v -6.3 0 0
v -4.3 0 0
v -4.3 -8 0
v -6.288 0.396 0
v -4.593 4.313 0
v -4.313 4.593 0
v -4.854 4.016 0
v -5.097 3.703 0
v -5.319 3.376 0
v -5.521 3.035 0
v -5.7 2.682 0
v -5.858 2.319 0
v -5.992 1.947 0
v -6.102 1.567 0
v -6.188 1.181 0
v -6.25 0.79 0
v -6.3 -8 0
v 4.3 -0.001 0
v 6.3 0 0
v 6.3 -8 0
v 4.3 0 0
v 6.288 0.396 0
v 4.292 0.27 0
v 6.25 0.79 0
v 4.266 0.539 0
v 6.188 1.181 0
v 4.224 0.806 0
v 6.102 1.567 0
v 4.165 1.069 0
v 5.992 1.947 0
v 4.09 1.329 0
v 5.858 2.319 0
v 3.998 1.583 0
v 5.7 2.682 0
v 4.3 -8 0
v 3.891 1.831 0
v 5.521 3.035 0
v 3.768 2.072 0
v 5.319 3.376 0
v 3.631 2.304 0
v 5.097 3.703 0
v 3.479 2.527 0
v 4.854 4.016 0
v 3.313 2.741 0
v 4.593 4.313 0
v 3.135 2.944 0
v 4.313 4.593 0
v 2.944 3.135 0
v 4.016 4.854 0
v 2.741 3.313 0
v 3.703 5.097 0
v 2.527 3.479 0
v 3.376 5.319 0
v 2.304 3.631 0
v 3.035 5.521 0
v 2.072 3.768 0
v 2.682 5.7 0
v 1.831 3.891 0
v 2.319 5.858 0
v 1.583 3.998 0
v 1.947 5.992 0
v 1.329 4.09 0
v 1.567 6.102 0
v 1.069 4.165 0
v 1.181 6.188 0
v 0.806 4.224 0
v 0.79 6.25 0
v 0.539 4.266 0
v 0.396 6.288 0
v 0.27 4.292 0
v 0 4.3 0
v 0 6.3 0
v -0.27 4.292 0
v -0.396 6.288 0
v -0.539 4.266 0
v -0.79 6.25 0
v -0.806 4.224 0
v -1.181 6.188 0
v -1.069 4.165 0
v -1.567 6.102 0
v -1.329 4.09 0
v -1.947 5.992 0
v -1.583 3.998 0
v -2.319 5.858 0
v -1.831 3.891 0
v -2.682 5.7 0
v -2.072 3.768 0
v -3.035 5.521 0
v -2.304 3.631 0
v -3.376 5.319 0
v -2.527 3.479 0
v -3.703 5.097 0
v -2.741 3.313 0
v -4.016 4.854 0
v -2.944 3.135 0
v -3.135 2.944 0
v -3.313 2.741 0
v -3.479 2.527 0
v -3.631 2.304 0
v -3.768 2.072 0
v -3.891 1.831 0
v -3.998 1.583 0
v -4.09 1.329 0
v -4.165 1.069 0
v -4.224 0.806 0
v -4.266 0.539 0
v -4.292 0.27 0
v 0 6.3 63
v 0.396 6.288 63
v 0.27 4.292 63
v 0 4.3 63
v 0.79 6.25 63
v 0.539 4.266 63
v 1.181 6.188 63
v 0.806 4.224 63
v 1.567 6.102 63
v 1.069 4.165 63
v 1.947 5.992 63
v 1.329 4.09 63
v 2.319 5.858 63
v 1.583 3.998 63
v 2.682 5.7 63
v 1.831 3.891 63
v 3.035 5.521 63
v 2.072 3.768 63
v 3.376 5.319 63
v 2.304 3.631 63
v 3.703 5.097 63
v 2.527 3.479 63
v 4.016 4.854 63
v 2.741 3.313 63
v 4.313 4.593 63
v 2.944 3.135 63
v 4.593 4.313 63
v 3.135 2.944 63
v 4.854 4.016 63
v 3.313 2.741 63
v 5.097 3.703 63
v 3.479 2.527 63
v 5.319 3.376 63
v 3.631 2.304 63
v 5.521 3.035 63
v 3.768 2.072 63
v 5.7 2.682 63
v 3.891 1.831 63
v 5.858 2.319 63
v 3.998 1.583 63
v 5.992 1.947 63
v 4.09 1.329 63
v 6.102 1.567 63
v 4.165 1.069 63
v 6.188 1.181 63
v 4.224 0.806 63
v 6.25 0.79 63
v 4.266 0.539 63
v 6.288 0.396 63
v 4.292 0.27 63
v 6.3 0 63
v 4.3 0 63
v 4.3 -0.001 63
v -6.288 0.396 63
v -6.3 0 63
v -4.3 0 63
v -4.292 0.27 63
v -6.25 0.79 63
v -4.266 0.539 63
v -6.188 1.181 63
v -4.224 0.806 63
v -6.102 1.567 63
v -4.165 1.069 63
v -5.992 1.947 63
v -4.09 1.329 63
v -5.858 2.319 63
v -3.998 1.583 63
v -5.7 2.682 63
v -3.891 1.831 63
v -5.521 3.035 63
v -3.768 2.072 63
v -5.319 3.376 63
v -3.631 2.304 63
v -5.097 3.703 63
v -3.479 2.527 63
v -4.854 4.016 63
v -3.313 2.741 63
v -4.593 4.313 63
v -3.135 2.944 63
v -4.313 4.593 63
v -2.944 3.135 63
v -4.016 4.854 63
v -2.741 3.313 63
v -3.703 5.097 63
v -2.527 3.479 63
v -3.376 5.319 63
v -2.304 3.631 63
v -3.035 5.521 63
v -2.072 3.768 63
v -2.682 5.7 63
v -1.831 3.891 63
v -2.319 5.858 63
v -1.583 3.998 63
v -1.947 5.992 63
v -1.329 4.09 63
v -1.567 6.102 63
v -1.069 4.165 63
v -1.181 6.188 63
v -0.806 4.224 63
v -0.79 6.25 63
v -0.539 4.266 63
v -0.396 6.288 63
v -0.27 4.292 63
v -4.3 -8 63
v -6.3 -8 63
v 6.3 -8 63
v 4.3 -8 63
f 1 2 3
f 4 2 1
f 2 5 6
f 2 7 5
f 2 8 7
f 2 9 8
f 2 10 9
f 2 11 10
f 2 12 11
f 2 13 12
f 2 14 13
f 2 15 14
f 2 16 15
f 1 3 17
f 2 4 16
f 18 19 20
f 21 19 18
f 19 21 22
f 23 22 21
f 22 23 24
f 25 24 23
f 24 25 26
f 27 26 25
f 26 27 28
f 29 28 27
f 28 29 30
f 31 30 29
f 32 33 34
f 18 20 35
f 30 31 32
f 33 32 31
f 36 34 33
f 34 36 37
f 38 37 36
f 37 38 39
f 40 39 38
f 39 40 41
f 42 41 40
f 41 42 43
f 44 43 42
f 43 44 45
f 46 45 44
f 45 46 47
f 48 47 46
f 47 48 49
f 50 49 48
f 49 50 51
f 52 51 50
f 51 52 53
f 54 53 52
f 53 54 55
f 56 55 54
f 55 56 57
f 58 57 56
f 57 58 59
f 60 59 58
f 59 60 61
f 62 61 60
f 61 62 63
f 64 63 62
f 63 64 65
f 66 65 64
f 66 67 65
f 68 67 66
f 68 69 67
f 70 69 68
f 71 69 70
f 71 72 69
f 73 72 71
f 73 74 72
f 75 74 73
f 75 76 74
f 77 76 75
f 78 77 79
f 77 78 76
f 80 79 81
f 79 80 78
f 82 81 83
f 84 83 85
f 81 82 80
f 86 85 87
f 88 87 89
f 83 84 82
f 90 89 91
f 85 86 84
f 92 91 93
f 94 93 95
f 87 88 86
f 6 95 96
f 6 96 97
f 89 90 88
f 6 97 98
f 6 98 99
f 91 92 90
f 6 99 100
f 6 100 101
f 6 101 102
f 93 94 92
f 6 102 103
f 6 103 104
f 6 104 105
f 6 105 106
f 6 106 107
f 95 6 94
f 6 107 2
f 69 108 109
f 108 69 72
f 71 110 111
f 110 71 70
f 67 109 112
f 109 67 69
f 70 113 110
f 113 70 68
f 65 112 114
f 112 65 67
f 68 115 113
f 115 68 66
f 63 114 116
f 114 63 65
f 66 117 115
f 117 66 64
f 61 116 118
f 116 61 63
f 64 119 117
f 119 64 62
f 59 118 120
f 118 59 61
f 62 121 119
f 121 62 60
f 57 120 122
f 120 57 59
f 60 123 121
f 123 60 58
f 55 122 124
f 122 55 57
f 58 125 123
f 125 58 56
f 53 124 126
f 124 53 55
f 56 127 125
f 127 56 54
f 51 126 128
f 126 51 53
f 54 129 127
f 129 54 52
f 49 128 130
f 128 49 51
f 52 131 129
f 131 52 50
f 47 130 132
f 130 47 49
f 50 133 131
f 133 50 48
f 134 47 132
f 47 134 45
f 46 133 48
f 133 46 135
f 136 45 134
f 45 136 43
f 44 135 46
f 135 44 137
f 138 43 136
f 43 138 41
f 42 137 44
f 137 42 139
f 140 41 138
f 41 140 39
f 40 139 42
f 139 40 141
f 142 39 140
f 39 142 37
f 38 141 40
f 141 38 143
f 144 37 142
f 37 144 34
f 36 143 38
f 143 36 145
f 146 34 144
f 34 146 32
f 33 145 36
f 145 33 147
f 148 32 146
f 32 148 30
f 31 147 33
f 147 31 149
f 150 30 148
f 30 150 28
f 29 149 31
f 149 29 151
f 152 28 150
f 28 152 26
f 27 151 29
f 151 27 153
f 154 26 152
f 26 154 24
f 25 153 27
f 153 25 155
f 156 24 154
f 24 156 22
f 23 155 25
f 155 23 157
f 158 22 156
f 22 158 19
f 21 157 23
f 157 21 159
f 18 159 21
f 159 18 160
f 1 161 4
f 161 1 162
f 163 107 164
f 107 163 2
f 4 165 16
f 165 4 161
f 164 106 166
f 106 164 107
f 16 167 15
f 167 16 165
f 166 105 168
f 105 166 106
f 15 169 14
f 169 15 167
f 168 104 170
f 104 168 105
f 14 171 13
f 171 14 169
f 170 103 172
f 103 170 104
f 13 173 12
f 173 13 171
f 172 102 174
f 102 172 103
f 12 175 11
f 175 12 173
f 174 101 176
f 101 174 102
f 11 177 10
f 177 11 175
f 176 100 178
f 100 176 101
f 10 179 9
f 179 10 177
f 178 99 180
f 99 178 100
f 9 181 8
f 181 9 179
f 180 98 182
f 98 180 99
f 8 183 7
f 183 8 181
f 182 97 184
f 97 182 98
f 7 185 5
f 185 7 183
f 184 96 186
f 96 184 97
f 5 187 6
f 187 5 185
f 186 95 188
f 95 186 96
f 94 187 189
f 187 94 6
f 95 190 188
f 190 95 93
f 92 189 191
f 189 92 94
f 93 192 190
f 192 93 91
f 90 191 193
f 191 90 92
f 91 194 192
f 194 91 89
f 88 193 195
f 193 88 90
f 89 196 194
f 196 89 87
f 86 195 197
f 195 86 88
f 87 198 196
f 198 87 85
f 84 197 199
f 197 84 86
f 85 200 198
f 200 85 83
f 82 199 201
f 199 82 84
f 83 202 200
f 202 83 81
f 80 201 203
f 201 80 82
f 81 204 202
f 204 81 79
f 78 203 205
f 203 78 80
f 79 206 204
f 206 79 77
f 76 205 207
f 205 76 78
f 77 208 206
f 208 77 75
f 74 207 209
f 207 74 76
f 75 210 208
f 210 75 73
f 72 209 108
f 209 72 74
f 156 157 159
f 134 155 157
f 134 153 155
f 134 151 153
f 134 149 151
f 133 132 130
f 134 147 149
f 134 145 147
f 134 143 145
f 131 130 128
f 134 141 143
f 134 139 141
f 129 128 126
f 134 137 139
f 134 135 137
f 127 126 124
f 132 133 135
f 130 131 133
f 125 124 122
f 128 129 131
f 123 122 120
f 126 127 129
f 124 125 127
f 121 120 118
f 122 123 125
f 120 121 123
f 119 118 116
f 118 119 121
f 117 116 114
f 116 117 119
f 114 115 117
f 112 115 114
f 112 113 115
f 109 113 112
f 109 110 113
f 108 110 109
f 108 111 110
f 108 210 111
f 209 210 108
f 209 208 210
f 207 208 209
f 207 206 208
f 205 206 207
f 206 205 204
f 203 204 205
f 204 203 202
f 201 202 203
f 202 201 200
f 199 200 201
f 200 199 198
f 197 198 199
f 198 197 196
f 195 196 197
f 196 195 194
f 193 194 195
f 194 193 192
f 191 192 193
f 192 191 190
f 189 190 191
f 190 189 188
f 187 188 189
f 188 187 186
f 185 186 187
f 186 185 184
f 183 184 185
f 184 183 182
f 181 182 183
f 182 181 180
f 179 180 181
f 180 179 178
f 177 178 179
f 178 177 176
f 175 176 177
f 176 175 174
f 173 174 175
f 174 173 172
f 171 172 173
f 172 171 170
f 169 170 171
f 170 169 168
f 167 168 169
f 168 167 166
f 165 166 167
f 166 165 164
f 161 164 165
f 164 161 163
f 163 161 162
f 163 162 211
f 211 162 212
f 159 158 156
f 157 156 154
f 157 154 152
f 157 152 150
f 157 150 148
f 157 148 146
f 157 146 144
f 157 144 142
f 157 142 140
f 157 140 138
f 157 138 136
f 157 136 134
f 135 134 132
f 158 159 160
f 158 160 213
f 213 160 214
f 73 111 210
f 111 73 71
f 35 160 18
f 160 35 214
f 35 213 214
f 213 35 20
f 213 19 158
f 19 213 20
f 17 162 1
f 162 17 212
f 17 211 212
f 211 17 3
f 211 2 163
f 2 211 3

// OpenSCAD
// Width of guide rod
width = 8;
// Lenght from motor holder and bearing block
lenght = 63;
// Thickness
thickness = 2;
// Gap between leveler and guide rod
gap=.3;
  
union() {
    translate([width/2+gap,0,0]) rotate([90,0,0]) linear_extrude(width) r();
    translate([-width/2-(thickness+gap),0,0]) rotate([90,0,0]) linear_extrude(width) r();
    //rotate_extrude(angle=180, convexity=20, $fn=100) translate([width/2+.2,0,0]) r();
    rotate([0,0,-90]) Tube_Sect(Height=lenght,Dout=(width+gap*2)+(thickness*2),Din=width+gap*2,StartAngle=0,EndAngle=180,Faces=50);
}

module r() {
    square([2,lenght]);
}

// thanks to jpmendes http://forum.openscad.org/This-seems-to-be-ultra-basic-I-cannot-have-the-rotate-extrude-angle-parameter-working-td15180.html
module Tube_Sect(Height,Dout,Din,StartAngle,EndAngle,Faces) { 
                        
        StartAngle= (StartAngle < 0) ? 360+StartAngle : StartAngle; 
        EndAngle= (EndAngle < 0) ? 360+EndAngle : EndAngle; 
        echo(StartAngle, EndAngle); 
        EndAngle2 =  (EndAngle < StartAngle) ? StartAngle : EndAngle; 
        StartAngle2 =  (EndAngle < StartAngle) ? EndAngle : StartAngle; 
        
        
        if (EndAngle2-StartAngle2<360){ 
        
                NSides= (Faces < 3 || Faces==undef)  ?  DefaultFaces : Faces; 
                n=floor((EndAngle2-StartAngle2)/120); 
                Sect1=EndAngle2-StartAngle2-n*120; 
                Sect2= (n>0) ? 120 : 0; 
                Sect3=(n>1) ? 120 : 0; 

         intersection(){ 
                rotate_extrude(, $fn=floor(NSides*360/(EndAngle2-StartAngle2))) 
                       translate([Din/2,0,0]) square([(Dout-Din)/2,Height]); 
                
                  union(){ 
                                hull(){ 
                                        rotate(StartAngle2) cube([0.001,Dout,Height+1]); 
                                        rotate((StartAngle2+Sect1)) cube([0.001,Dout,Height+1]); 
                                } 
                                        hull(){ 
                                        rotate((StartAngle2+Sect1)) cube([0.001,Dout,Height+1]); 
                                        rotate((StartAngle2+Sect1+Sect2)) cube([0.001,Dout,Height+1]); 
                                } 
                                        hull(){ 
                                        rotate((StartAngle2+Sect1+Sect2)) cube([0.001,Dout,Height+1]); 
                                        rotate((StartAngle2+Sect1+Sect2+Sect3)) cube([0.001,Dout,Height+1]); 
                                } 
                        }	
                } 
                } else { echo("Only rotations less than 360 degrees are supported");} 
                
}
